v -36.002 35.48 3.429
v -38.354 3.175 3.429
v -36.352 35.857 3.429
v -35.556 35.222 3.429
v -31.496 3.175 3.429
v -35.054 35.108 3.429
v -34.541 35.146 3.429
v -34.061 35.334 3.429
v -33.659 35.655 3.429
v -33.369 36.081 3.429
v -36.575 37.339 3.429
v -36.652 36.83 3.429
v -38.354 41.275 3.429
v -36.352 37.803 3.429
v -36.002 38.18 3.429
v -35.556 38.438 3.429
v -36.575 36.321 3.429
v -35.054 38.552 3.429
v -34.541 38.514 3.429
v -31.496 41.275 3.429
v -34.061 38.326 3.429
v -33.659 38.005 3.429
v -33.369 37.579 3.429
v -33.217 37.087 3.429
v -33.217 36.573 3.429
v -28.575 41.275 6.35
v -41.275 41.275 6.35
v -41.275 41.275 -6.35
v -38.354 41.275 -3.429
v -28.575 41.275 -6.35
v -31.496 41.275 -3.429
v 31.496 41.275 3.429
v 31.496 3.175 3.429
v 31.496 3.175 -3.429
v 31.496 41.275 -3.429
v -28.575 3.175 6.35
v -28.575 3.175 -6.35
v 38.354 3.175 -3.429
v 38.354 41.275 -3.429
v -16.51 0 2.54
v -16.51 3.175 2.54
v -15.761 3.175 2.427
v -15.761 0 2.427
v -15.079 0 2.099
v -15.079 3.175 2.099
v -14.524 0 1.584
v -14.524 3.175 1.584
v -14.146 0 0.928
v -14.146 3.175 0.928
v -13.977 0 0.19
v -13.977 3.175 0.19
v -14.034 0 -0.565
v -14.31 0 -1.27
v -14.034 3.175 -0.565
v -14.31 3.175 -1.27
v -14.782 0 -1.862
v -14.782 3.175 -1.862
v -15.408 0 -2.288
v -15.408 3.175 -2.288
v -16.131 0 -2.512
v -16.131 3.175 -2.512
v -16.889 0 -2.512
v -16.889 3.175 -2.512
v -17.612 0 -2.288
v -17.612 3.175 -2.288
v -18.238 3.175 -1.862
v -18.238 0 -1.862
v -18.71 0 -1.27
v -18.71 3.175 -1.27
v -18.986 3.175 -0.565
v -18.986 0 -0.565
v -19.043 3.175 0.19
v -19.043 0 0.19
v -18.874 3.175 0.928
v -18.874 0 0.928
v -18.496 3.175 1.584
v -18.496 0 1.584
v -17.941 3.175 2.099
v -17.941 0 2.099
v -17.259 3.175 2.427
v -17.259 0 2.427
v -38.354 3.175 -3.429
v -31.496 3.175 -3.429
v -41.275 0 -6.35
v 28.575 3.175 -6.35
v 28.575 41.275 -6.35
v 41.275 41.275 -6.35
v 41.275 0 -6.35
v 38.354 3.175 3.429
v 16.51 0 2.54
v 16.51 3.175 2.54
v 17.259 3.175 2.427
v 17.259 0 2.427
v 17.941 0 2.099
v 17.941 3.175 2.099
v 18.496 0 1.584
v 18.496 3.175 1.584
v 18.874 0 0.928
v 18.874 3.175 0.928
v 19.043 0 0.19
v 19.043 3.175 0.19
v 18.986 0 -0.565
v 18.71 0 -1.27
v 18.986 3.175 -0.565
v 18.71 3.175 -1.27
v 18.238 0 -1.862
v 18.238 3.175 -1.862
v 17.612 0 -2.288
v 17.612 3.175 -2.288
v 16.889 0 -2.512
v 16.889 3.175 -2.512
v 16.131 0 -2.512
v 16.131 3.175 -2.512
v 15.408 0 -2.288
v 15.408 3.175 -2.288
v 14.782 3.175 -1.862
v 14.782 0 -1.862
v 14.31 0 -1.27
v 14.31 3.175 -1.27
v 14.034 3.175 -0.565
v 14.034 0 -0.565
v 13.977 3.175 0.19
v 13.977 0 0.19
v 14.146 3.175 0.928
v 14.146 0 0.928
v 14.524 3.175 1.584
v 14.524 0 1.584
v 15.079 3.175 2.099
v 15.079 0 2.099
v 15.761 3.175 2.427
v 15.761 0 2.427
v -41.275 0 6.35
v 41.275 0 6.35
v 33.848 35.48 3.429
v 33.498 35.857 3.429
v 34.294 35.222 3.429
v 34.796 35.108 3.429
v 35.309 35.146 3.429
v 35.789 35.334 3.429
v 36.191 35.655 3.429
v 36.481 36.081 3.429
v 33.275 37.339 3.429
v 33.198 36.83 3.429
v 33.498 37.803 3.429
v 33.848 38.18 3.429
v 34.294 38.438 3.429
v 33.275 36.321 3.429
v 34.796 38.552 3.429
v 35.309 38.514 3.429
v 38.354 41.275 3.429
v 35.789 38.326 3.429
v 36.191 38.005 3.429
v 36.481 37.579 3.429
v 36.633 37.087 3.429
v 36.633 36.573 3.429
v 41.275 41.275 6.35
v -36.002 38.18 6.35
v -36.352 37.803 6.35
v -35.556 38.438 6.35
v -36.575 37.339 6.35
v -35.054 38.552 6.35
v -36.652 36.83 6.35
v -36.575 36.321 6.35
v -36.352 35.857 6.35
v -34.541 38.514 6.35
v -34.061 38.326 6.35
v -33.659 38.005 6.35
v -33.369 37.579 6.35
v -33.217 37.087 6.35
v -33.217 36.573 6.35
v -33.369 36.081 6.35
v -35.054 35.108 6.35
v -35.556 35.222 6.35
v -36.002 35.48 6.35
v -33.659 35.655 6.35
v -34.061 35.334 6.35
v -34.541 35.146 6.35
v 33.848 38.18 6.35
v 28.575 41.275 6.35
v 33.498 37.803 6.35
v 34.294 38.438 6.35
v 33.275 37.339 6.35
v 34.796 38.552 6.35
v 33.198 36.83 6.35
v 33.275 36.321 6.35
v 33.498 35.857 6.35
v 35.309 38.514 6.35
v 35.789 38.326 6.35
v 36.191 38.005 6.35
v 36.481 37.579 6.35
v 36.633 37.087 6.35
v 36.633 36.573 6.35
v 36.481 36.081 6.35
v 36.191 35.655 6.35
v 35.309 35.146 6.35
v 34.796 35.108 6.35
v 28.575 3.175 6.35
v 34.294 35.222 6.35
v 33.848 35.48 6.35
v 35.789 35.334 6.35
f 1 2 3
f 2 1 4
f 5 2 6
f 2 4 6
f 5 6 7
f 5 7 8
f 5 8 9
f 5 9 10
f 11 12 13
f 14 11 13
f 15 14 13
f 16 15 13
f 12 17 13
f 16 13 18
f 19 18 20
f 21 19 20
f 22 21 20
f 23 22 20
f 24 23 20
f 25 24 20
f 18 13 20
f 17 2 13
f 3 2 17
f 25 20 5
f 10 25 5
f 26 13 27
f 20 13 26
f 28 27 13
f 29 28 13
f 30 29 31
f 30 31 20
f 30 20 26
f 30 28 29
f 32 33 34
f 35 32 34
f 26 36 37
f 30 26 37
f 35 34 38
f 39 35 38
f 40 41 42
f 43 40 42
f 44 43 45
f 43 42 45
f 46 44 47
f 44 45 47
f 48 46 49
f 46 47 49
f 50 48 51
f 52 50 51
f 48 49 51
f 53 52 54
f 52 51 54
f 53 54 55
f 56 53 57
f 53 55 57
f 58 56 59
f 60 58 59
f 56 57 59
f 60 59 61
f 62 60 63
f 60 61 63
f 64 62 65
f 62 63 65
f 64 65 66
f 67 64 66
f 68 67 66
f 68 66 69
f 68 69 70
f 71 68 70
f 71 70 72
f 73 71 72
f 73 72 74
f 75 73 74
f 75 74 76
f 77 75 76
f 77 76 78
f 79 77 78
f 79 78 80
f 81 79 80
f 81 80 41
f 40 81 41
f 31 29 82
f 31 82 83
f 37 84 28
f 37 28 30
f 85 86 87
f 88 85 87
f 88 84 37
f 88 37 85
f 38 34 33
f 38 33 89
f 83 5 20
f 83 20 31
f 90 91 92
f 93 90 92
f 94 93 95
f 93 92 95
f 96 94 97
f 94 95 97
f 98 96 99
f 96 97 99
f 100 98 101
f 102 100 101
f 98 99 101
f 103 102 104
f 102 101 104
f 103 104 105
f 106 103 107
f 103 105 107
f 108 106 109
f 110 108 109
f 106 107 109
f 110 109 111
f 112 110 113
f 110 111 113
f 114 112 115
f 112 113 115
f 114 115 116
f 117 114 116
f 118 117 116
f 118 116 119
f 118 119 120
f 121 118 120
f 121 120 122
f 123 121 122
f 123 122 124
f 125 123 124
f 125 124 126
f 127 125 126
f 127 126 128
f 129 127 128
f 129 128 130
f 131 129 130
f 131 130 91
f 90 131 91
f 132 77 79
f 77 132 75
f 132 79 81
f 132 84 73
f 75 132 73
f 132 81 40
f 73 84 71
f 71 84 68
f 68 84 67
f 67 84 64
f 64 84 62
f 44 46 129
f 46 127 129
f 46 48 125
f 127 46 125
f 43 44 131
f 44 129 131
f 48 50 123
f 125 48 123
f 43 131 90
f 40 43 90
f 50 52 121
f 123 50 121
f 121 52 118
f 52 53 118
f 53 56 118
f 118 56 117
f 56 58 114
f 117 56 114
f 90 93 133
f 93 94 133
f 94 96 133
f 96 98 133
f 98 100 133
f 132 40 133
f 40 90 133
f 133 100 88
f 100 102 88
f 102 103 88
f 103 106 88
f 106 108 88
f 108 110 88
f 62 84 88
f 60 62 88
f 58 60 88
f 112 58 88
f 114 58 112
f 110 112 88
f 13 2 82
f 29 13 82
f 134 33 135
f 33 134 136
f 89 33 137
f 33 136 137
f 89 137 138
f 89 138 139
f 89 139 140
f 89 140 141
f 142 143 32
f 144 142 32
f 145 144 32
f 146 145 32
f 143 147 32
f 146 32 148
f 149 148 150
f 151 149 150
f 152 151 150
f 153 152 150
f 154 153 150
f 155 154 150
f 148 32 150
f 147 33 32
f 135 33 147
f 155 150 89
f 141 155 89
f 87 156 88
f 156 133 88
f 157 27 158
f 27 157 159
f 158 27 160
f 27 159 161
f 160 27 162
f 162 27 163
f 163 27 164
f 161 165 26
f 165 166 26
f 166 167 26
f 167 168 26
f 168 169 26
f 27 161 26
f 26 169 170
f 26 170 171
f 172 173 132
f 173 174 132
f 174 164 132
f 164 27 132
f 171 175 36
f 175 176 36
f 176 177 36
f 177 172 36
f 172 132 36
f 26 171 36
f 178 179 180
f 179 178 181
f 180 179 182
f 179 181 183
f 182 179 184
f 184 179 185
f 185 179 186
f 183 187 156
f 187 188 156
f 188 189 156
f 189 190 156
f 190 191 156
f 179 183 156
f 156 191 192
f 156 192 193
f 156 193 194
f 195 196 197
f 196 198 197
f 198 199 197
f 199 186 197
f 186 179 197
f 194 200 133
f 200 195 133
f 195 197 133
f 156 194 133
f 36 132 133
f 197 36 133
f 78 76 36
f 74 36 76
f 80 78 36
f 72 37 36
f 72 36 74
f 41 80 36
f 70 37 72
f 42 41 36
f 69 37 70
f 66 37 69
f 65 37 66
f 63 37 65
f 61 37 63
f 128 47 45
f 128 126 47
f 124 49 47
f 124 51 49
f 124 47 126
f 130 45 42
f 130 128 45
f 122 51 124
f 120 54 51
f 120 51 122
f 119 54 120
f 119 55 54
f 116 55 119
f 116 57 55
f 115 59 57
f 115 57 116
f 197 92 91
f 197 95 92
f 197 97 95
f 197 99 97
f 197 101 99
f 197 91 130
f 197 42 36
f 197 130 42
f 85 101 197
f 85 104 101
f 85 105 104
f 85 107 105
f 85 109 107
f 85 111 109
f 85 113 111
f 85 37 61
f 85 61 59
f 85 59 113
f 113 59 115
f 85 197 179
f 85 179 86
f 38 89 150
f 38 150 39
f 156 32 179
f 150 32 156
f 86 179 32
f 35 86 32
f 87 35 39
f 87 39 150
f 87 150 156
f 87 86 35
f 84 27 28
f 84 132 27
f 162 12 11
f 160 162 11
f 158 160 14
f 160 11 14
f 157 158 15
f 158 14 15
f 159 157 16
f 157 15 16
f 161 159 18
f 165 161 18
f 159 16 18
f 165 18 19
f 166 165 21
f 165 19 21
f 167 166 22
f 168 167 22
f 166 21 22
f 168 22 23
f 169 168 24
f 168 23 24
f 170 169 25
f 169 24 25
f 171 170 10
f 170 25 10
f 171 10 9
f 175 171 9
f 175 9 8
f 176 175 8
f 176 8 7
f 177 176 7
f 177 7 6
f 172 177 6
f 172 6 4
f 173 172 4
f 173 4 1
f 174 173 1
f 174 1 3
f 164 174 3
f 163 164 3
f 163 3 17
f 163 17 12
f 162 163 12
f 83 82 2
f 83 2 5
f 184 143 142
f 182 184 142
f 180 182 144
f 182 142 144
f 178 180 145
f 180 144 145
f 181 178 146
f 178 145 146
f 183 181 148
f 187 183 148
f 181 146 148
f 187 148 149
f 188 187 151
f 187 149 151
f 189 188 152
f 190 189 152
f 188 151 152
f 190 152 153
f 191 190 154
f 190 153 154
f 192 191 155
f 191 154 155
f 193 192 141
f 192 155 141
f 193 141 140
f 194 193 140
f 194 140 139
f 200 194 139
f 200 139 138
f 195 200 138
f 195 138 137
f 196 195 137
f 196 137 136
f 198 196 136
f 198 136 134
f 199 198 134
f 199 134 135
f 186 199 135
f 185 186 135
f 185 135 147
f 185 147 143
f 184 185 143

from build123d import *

# Parameters (mm, degrees)
SKETCH1_W                 = 82.55
SKETCH1_H                 = 12.7
BOSS_EXTRUDE1_DEPTH       = 3.175
SKETCH3_W                 = 12.7
SKETCH3_H                 = 12.7
BOSS_EXTRUDE2_DEPTH       = 38.1
SKETCH4_W                 = 12.7
SKETCH4_H                 = 12.7
BOSS_EXTRUDE3_DEPTH       = 38.1
SKETCH5_W                 = 6.858
SKETCH5_H                 = 6.858
CUT_EXTRUDE1_DEPTH        = 38.1
SKETCH6_W                 = 6.858
SKETCH6_H                 = 6.858
CUT_EXTRUDE2_DEPTH        = 38.1
SKETCH9_R                 = 2.54
CUT_EXTRUDE3_DEPTH        = 38.1
F_8_32_TAPPED_HOLE2_D     = 3.4544
F_8_32_TAPPED_HOLE2_DEPTH = 2.921


with BuildPart() as part:
    # Sketch1 → Boss-Extrude1 (new body)
    with BuildSketch(Plane(origin=(0, 0, 0), x_dir=(1, 0, 0), z_dir=(0, 1, 0))):
        Rectangle(SKETCH1_W, SKETCH1_H)
    extrude(amount=BOSS_EXTRUDE1_DEPTH)

    # Sketch3 → Boss-Extrude2 (add)
    with BuildSketch(Plane(origin=(0, 3.175, 0), x_dir=(1, 0, 0), z_dir=(0, 1, 0))):
        with Locations((-34.925, 0)):
            Rectangle(SKETCH3_W, SKETCH3_H)
    extrude(amount=BOSS_EXTRUDE2_DEPTH)

    # Sketch4 → Boss-Extrude3 (add)
    with BuildSketch(Plane(origin=(0, 3.175, 0), x_dir=(1, 0, 0), z_dir=(0, 1, 0))):
        with Locations((34.925, 0)):
            Rectangle(SKETCH4_W, SKETCH4_H)
    extrude(amount=BOSS_EXTRUDE3_DEPTH)

    # Sketch5 → Cut-Extrude1 (cut)
    with BuildSketch(Plane(origin=(0, 41.275, 0), x_dir=(1, 0, 0), z_dir=(0, 1, 0))):
        with Locations((-34.925, 0)):
            Rectangle(SKETCH5_W, SKETCH5_H)
    extrude(amount=-CUT_EXTRUDE1_DEPTH, mode=Mode.SUBTRACT)

    # Sketch6 → Cut-Extrude2 (cut)
    with BuildSketch(Plane(origin=(0, 41.275, 0), x_dir=(1, 0, 0), z_dir=(0, 1, 0))):
        with Locations((34.925, 0)):
            Rectangle(SKETCH6_W, SKETCH6_H)
    extrude(amount=-CUT_EXTRUDE2_DEPTH, mode=Mode.SUBTRACT)

    # Sketch9 → Cut-Extrude3 (cut)
    with BuildSketch(Plane(origin=(0, 3.175, 0), x_dir=(1, 0, 0), z_dir=(0, 1, 0))):
        with Locations(Location((-16.51, 0, 0), (0, 0, 270))):
            Circle(SKETCH9_R)
        with Locations(Location((16.51, 0, 0), (0, 0, 270))):
            Circle(SKETCH9_R)
    extrude(amount=-CUT_EXTRUDE3_DEPTH, mode=Mode.SUBTRACT)

    # #8-32 Tapped Hole2
    with Locations(Plane(origin=(-34.925, 36.83, 6.35), x_dir=(1, 0, 0), z_dir=(0, 0, 1))):
        with Locations((0, 0), (69.85, 0)):
            Hole(F_8_32_TAPPED_HOLE2_D / 2, depth=F_8_32_TAPPED_HOLE2_DEPTH)


solid = part.part
